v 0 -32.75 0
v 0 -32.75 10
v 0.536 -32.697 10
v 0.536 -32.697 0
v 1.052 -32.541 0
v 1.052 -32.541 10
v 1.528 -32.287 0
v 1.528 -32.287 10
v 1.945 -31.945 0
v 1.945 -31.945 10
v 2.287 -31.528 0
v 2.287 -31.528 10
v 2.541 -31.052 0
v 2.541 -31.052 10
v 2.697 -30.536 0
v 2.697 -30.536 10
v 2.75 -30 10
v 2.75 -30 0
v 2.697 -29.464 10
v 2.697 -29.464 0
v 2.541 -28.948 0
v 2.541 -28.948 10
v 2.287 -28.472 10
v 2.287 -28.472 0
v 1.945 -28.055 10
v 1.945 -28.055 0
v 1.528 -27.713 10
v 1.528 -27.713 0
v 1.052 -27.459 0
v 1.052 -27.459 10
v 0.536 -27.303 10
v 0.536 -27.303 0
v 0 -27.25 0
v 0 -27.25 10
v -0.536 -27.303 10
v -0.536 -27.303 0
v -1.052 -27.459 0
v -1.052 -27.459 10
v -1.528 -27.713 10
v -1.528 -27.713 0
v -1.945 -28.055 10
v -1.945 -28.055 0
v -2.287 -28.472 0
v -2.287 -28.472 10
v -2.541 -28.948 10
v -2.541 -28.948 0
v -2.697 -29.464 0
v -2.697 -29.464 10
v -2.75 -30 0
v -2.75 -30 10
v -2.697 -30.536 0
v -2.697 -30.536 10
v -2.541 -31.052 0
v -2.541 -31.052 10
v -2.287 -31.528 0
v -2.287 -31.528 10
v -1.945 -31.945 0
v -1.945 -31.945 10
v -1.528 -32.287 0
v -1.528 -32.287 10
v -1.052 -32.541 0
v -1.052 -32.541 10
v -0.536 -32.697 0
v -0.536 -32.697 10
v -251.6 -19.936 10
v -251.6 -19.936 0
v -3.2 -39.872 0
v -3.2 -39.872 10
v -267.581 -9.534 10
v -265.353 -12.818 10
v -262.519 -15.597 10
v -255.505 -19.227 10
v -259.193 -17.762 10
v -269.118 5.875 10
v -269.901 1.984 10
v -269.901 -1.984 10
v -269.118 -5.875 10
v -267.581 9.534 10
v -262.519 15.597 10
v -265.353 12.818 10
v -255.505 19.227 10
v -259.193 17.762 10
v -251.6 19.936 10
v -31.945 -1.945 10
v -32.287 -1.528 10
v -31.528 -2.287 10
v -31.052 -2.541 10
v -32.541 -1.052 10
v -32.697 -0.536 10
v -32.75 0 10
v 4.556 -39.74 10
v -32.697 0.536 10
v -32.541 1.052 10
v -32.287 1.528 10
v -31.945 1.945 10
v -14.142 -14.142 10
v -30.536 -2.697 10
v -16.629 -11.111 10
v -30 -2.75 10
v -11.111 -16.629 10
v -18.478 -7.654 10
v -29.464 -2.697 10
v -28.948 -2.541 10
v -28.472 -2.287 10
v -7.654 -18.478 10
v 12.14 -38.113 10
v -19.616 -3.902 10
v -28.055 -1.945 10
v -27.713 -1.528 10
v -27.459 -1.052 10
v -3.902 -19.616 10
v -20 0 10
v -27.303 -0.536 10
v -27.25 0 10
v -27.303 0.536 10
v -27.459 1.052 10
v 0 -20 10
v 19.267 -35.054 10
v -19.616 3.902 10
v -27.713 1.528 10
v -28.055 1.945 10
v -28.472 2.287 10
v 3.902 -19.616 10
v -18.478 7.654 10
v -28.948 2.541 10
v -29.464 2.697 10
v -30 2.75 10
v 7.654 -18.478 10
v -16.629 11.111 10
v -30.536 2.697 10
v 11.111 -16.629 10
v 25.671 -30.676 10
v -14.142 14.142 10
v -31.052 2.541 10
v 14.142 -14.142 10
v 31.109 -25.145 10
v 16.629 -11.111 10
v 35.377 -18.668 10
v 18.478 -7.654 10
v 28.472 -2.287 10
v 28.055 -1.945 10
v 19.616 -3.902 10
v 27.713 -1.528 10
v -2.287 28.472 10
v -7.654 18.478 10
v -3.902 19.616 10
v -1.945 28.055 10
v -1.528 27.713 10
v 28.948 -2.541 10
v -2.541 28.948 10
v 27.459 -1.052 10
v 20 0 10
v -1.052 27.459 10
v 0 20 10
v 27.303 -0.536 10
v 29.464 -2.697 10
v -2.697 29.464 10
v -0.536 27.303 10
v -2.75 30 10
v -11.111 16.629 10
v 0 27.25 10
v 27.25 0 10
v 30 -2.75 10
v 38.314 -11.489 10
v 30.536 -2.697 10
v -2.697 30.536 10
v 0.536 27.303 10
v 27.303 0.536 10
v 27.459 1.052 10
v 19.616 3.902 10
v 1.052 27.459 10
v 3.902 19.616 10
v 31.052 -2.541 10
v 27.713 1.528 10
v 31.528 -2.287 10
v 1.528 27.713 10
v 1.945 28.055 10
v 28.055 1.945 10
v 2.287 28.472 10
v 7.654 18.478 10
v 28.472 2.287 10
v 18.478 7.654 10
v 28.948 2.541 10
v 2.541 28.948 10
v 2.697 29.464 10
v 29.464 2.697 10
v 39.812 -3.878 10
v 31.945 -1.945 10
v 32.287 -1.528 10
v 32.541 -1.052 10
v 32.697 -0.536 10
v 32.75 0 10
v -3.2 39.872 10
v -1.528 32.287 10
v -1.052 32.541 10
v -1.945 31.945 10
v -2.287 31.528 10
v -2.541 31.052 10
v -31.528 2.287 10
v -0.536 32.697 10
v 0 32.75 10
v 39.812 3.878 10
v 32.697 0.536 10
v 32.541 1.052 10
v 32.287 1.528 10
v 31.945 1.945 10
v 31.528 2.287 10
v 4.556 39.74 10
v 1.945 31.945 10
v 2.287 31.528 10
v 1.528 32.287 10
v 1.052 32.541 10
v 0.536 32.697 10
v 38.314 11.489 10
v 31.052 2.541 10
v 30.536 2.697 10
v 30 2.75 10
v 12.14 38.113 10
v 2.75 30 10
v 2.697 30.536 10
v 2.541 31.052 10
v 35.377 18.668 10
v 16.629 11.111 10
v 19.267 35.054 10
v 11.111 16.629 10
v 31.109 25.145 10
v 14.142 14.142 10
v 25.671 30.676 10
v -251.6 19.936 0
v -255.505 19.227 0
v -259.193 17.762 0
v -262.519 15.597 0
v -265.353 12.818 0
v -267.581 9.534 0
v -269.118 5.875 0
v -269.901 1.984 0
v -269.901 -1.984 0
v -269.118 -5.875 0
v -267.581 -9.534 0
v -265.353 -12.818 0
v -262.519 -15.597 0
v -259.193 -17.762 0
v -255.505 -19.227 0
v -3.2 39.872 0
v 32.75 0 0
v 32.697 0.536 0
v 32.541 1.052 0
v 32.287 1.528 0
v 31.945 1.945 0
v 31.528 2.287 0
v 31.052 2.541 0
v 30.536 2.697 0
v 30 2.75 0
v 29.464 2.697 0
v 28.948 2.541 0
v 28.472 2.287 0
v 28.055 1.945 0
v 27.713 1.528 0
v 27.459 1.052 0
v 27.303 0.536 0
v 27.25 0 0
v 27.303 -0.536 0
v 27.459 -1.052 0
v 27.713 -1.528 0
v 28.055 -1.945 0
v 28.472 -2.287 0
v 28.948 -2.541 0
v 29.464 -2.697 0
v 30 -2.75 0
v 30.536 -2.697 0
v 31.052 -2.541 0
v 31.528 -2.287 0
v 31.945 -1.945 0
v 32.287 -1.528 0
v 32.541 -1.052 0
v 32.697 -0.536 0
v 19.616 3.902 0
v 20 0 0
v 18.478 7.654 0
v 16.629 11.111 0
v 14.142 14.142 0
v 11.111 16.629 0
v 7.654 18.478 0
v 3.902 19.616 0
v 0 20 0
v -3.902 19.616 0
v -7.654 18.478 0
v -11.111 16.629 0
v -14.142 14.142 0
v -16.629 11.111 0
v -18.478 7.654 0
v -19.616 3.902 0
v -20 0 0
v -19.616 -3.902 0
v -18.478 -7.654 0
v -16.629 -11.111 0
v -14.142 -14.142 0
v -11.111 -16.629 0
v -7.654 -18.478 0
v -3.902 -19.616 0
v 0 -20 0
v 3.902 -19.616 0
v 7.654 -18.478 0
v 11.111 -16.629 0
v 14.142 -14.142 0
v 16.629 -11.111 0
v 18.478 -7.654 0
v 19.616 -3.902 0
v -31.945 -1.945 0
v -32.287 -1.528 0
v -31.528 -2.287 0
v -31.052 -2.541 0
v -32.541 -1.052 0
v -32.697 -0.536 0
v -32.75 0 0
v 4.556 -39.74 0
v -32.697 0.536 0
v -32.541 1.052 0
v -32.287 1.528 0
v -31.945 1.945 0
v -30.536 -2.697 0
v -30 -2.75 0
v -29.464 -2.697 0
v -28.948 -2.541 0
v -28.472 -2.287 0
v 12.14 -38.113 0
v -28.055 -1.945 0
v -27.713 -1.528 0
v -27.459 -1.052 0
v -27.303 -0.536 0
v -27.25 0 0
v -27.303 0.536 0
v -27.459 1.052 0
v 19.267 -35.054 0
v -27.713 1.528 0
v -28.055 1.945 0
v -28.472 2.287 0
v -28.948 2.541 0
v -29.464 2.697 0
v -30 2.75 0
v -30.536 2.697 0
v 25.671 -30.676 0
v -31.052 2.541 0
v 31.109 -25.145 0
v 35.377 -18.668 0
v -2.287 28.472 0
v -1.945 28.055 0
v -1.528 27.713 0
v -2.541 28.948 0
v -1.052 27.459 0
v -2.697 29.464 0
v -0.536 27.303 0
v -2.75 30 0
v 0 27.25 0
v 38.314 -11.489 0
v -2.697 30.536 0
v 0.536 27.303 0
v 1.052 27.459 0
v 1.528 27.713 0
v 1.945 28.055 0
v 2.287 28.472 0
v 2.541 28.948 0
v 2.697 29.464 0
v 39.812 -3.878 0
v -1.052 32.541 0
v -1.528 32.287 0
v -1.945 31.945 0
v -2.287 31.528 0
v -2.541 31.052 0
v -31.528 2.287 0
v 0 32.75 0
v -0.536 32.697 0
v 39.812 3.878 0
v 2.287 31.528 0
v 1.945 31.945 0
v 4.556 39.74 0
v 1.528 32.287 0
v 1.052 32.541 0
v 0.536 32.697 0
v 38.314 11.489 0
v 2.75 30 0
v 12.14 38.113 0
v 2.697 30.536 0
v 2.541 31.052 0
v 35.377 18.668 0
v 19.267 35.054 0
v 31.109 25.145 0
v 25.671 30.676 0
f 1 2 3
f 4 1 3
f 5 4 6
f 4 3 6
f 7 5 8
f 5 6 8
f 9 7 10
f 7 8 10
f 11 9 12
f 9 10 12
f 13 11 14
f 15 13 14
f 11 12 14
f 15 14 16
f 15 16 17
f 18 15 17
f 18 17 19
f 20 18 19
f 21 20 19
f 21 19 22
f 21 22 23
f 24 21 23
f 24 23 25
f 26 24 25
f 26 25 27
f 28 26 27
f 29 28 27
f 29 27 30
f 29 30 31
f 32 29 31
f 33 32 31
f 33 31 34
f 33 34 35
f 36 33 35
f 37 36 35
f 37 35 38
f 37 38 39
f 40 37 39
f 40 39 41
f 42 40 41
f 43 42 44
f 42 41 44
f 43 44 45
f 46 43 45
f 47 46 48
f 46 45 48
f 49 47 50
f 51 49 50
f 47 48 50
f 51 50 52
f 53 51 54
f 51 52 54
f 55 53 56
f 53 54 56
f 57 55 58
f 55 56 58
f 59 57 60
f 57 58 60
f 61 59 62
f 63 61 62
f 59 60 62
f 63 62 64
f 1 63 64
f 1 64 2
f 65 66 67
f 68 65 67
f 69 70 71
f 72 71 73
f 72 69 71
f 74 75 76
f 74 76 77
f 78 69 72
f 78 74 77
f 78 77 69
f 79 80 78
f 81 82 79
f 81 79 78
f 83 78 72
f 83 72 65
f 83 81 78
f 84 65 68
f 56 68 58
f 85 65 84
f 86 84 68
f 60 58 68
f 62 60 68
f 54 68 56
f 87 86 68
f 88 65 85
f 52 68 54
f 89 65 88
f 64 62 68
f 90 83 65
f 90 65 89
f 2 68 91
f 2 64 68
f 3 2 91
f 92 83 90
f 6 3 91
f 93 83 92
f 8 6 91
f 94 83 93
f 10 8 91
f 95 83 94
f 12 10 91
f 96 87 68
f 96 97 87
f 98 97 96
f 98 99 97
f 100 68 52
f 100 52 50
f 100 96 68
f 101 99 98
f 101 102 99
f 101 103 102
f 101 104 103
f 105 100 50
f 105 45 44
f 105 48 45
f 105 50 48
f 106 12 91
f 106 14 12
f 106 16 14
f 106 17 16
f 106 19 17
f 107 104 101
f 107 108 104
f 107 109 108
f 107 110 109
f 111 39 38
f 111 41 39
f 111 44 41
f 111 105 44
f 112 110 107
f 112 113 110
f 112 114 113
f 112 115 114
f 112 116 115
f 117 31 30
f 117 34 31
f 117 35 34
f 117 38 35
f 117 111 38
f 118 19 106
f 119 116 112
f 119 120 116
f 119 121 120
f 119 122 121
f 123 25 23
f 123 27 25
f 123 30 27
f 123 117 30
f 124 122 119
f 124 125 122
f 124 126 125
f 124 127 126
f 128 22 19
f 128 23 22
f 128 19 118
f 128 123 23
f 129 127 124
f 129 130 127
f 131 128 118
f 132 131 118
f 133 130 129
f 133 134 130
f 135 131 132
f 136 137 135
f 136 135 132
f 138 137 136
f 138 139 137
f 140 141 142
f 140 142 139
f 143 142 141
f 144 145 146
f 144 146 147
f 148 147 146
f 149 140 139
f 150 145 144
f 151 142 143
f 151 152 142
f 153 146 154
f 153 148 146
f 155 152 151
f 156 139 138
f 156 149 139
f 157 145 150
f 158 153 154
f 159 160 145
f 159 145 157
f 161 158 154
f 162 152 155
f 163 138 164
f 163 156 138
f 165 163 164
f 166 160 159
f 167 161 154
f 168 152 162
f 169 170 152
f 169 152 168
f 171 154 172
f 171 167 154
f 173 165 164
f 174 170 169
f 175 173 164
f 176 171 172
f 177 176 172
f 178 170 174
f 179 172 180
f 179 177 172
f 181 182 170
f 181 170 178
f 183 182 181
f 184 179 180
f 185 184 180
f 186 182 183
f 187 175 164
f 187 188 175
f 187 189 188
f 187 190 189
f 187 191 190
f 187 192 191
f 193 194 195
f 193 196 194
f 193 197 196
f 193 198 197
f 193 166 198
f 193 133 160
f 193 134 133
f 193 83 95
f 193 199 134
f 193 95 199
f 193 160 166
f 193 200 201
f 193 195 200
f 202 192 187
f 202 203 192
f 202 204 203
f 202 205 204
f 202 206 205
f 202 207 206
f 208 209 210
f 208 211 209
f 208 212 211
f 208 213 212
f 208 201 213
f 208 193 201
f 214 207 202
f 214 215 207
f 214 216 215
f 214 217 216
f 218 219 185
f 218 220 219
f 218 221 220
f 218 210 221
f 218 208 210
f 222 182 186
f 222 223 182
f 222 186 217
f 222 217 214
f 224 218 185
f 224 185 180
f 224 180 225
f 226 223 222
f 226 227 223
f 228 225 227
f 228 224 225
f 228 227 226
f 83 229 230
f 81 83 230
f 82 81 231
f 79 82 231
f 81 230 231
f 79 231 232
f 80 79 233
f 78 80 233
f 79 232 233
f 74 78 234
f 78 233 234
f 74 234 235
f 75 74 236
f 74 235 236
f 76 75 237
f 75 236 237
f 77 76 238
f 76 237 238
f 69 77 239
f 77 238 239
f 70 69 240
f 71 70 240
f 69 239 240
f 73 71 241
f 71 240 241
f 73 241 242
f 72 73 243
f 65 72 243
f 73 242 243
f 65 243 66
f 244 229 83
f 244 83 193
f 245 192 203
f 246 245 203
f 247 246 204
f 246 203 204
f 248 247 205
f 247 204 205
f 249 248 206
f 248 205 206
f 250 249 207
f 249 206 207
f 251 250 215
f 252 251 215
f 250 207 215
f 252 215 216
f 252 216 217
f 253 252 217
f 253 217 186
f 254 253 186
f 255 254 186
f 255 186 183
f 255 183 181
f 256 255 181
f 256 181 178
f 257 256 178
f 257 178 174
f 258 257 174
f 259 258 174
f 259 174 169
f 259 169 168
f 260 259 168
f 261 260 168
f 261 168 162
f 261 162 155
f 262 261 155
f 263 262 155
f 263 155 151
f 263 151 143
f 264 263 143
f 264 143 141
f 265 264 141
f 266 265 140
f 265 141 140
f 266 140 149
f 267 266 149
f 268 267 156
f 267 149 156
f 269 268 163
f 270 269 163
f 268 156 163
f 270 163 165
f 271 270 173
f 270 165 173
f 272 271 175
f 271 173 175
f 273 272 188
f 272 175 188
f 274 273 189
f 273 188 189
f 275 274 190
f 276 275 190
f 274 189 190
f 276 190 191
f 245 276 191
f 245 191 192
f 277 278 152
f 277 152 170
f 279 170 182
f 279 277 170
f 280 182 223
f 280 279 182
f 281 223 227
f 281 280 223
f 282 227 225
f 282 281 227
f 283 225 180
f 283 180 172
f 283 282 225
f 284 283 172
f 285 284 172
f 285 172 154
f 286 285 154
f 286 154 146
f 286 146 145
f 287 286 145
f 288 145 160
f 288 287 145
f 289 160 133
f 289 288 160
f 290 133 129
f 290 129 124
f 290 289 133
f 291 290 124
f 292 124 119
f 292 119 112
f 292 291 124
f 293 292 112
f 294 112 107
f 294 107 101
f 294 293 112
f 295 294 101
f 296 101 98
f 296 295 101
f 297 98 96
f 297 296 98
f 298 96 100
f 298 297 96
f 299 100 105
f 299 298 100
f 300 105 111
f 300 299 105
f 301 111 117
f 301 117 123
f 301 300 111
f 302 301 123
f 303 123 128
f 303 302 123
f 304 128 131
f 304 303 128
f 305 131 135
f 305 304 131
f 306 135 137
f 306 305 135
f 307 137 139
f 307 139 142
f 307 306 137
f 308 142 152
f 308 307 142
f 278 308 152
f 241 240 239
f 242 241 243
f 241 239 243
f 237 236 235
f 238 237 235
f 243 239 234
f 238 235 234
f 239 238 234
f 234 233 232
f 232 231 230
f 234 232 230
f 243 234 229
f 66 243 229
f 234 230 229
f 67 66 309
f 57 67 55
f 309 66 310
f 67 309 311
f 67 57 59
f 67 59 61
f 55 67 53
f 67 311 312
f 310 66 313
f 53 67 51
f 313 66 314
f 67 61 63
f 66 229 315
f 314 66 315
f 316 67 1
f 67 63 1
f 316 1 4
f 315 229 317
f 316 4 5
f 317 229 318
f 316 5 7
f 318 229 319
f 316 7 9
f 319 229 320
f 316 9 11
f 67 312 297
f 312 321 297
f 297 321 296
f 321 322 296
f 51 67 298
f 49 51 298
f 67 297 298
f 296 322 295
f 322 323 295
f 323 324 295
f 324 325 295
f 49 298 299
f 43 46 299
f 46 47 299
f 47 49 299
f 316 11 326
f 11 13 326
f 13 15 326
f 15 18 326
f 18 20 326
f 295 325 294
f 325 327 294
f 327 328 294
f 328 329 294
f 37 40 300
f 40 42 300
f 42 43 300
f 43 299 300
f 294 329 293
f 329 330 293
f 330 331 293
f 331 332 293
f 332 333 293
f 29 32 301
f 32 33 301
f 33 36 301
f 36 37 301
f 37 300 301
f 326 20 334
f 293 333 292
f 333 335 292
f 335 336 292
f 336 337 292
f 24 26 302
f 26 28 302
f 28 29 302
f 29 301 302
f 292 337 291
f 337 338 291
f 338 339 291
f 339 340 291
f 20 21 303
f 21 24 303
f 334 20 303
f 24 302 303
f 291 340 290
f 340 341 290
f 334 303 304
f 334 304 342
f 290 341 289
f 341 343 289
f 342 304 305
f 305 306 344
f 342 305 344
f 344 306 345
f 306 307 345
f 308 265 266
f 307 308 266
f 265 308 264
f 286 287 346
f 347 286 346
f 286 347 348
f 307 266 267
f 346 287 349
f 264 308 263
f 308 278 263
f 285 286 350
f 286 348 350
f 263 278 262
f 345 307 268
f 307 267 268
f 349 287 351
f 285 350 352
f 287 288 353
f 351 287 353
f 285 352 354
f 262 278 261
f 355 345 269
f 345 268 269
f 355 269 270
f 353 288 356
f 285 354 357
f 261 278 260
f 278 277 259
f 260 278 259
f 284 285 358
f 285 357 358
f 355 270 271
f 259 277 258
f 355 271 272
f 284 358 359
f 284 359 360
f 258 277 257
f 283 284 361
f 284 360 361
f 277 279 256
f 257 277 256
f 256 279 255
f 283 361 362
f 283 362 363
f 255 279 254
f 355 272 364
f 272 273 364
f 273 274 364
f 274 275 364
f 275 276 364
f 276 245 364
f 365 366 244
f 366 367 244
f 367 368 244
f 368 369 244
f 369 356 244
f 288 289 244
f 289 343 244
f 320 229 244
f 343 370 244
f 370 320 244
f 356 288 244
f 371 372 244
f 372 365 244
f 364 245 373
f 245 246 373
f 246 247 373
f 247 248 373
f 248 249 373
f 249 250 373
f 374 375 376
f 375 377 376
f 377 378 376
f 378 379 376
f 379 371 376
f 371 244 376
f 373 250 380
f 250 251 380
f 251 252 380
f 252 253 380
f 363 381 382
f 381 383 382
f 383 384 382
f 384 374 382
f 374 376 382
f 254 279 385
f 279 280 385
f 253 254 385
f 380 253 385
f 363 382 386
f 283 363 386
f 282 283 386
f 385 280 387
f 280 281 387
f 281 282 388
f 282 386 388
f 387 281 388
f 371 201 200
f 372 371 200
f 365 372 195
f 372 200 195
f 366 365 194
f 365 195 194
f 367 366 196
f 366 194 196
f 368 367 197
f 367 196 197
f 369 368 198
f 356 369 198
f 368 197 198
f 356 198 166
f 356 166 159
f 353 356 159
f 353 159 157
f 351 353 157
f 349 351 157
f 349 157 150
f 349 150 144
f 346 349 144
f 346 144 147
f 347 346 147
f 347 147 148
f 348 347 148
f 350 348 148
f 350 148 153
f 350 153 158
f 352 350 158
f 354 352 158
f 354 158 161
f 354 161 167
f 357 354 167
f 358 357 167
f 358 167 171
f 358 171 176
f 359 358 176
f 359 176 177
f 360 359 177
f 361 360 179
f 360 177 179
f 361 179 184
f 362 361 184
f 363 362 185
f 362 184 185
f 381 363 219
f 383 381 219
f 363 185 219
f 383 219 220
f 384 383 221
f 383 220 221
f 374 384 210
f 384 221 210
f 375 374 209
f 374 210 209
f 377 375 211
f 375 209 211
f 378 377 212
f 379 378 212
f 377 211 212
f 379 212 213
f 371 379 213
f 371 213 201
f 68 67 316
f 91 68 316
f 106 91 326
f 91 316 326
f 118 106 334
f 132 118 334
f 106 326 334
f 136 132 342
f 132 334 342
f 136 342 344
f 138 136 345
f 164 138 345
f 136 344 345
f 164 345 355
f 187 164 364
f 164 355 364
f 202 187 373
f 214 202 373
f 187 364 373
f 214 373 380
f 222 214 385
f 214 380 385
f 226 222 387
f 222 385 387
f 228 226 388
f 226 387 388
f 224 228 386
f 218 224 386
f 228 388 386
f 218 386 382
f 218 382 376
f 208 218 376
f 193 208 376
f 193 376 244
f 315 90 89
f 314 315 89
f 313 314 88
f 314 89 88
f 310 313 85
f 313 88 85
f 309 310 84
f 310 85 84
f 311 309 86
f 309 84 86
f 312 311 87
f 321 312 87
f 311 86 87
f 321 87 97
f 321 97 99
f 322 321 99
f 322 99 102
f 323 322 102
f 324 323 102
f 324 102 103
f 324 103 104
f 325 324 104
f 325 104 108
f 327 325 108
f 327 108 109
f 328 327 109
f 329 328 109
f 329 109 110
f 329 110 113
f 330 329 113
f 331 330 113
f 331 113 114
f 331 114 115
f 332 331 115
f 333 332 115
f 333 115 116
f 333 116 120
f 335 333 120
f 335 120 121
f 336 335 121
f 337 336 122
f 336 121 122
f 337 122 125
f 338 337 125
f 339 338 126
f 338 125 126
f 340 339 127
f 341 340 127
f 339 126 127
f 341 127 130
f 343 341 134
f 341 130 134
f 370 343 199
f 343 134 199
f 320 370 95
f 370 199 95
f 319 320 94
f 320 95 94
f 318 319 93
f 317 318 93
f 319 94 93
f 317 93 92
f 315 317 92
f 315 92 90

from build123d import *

# Parameters (mm, degrees)
SKETCH_R           = 20
PAD_DEPTH          = 10
SKETCH001_R        = 2.75
HOLE_DEPTH         = 25
POLARPATTERN_COUNT = 4


with BuildPart() as part:
    # Sketch → Pad (new body)
    with BuildSketch(Plane.XY):
        with BuildLine():
            ThreePointArc((-251.6, 19.935897), (-270, 0), (-251.6, -19.935897))
            Line((-251.6, -19.935897), (-3.2, -39.871795))
            ThreePointArc((-3.2, -39.871795), (40, 0), (-3.2, 39.871795))
            Line((-251.6, 19.935897), (-3.2, 39.871795))
        make_face()
        Circle(SKETCH_R, mode=Mode.SUBTRACT)
    extrude(amount=PAD_DEPTH)

    # Sketch001 (on Face7 of Pad) → Hole (cut)
    with BuildSketch(Plane.XY.offset(10)):
        with Locations((30, 0)):
            Circle(SKETCH001_R)
    hole = extrude(amount=-HOLE_DEPTH, mode=Mode.SUBTRACT)

    # PolarPattern: Hole ×4 about axis
    polarpattern_axis = Axis((0, 0, 10), (0, 0, 1))
    for i in range(1, POLARPATTERN_COUNT):
        add(hole.rotate(polarpattern_axis, i * 360 / POLARPATTERN_COUNT), mode=Mode.SUBTRACT)


solid = part.part
